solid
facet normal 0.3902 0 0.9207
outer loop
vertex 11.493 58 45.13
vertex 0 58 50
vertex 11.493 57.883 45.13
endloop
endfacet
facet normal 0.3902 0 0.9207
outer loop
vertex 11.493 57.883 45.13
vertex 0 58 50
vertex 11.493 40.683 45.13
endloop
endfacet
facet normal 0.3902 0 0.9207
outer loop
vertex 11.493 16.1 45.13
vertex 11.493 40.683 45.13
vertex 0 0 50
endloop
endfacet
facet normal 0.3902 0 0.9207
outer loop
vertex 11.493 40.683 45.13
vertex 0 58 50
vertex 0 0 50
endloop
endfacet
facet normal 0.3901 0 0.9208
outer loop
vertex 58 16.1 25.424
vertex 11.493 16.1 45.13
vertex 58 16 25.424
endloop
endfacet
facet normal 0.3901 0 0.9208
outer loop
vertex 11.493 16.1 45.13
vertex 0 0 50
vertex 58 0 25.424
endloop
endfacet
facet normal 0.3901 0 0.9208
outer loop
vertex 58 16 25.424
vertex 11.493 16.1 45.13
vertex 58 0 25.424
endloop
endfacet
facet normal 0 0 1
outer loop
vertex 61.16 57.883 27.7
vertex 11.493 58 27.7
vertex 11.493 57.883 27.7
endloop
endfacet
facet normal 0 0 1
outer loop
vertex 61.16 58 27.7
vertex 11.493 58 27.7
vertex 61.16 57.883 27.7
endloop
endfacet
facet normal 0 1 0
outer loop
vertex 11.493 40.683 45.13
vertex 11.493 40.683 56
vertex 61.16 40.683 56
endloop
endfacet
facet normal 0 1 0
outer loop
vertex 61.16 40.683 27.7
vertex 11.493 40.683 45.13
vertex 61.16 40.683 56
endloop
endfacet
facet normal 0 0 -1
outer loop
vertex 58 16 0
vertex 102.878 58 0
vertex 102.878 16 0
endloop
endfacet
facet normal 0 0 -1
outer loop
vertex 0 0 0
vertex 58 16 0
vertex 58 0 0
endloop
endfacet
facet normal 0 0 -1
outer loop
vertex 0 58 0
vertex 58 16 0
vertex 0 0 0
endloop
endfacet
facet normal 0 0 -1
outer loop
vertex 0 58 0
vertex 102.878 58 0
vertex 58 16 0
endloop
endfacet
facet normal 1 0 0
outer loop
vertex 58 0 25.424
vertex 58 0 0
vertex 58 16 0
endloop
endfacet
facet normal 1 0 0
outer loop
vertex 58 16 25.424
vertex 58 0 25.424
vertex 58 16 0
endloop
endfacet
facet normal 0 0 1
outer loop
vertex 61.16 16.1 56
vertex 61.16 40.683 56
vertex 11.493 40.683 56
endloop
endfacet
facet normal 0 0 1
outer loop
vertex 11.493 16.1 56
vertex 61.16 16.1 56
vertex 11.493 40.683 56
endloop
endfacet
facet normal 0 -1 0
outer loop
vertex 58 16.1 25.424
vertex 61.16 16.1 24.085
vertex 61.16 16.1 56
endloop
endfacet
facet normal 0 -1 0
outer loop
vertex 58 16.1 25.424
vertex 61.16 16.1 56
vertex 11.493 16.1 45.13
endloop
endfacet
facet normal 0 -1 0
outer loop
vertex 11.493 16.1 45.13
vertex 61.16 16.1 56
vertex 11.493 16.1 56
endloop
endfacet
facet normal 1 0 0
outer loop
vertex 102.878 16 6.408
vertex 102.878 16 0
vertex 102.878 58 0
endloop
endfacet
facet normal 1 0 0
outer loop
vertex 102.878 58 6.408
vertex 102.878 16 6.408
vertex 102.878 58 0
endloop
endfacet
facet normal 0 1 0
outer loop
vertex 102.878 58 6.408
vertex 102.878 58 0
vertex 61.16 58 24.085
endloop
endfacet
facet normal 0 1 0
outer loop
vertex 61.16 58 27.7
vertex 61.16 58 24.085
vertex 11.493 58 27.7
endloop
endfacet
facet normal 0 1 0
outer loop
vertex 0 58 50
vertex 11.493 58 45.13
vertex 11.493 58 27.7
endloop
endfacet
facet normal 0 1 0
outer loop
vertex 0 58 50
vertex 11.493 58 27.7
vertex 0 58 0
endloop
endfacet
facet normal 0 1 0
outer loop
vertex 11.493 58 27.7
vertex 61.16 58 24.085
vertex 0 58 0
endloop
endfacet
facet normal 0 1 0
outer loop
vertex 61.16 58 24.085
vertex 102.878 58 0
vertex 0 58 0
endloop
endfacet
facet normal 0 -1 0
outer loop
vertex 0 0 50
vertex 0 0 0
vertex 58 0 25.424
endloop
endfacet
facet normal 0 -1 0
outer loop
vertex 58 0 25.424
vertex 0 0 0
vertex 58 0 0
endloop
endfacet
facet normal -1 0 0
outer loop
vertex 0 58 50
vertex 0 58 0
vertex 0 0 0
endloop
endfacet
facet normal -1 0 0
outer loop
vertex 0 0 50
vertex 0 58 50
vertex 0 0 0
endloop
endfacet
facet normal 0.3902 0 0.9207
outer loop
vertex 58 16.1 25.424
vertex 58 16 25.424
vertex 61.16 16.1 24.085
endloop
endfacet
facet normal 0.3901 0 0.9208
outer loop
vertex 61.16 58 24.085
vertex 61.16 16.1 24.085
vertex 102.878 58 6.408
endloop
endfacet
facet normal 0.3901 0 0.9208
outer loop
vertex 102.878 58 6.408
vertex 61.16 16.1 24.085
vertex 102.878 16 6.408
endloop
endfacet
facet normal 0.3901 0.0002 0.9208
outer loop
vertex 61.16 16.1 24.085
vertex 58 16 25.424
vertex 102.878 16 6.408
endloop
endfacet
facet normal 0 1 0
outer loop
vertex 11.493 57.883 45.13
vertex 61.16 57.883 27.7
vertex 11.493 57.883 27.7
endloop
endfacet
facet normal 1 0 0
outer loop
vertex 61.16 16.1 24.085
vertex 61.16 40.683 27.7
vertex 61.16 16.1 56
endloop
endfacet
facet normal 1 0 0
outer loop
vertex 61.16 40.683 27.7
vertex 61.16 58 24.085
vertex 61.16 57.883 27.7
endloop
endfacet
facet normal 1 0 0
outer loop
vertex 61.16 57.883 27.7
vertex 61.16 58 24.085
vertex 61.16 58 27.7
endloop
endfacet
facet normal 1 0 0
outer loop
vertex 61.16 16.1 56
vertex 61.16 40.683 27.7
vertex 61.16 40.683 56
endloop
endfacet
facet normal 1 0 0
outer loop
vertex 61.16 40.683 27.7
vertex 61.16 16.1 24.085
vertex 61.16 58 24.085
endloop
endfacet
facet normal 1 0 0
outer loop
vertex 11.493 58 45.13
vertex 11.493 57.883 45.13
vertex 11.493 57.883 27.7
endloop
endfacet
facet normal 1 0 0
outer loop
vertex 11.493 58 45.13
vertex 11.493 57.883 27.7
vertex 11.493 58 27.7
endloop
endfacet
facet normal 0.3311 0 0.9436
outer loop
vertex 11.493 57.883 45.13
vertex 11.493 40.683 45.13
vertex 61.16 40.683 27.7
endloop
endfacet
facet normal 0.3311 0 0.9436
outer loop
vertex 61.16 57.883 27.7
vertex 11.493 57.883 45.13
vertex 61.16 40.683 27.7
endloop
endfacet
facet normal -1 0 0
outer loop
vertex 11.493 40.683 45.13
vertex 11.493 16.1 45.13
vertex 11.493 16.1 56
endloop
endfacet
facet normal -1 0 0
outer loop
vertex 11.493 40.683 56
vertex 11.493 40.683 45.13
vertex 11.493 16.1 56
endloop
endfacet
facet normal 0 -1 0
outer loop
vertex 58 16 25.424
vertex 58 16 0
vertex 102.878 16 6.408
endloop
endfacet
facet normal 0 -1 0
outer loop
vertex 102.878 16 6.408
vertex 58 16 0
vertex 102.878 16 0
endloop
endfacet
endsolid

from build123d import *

# Parameters (mm, degrees)
F1_DEPTH  = 50
F3_DEPTH  = 81.2
F4_DEPTH  = 25
F5_W      = 49.6666632582
F5_H      = 56
F6_DEPTH  = 41.9
F7_W      = 49.6666632582
F7_H      = 17.3173451722
F8_DEPTH  = 28.3
F10_DEPTH = 17.2


with BuildPart() as f1:
    # F0 (on Top) → F1 (new body)
    with BuildSketch(Plane.XY):
        Polygon((102.878117487, 58), (0, 58), (0, 0), (58, 0), (58, 16), (16, 16), (16, 42), (88, 42), (88, 16), (102.878117487, 16), align=None)
        Polygon((16, 16), (58, 16), (88, 16), (88, 42), (16, 42), align=None)
    extrude(amount=F1_DEPTH)

    # F2 (on face) → F3 (cut)
    with BuildSketch(Plane.XZ):
        Polygon((58, 50), (0, 50), (58, 25.4237288136), align=None)
        Polygon((58, 50), (58, 25.4237288136), (118, 0), (102.9013991356, 50), align=None)
    extrude(amount=-F3_DEPTH, mode=Mode.SUBTRACT)

    # F2 (on face) → F4 (cut)
    with BuildSketch(Plane.XZ):
        Polygon((58, 50), (58, 25.4237288136), (118, 0), (102.9013991356, 50), align=None)
    extrude(amount=-F4_DEPTH, mode=Mode.SUBTRACT)

    # F5 (on face) → F6 (join)
    with BuildSketch(Plane(origin=(0, 58, 0), x_dir=(-1, 0, 0), z_dir=(0, 1, 0))):
        with Locations((-36.3266665494, 28)):
            Rectangle(F5_W, F5_H)
    extrude(amount=-F6_DEPTH)

    # F7 (on face) → F8 (cut)
    with BuildSketch(Plane.XY.offset(56)):
        with Locations((36.3266665494, 49.3413274139)):
            Rectangle(F7_W, F7_H)
    extrude(amount=-F8_DEPTH, mode=Mode.SUBTRACT)

    # F9 (on face) → F10 (join)
    with BuildSketch(Plane(origin=(0, 40.6826548278, 0), x_dir=(-1, 0, 0), z_dir=(0, 1, 0))):
        Polygon((-11.4933349202, 45.1299428304), (-61.1599981785, 27.7), (-11.4933349202, 27.7), align=None)
    extrude(amount=F10_DEPTH)


solid = f1.part
